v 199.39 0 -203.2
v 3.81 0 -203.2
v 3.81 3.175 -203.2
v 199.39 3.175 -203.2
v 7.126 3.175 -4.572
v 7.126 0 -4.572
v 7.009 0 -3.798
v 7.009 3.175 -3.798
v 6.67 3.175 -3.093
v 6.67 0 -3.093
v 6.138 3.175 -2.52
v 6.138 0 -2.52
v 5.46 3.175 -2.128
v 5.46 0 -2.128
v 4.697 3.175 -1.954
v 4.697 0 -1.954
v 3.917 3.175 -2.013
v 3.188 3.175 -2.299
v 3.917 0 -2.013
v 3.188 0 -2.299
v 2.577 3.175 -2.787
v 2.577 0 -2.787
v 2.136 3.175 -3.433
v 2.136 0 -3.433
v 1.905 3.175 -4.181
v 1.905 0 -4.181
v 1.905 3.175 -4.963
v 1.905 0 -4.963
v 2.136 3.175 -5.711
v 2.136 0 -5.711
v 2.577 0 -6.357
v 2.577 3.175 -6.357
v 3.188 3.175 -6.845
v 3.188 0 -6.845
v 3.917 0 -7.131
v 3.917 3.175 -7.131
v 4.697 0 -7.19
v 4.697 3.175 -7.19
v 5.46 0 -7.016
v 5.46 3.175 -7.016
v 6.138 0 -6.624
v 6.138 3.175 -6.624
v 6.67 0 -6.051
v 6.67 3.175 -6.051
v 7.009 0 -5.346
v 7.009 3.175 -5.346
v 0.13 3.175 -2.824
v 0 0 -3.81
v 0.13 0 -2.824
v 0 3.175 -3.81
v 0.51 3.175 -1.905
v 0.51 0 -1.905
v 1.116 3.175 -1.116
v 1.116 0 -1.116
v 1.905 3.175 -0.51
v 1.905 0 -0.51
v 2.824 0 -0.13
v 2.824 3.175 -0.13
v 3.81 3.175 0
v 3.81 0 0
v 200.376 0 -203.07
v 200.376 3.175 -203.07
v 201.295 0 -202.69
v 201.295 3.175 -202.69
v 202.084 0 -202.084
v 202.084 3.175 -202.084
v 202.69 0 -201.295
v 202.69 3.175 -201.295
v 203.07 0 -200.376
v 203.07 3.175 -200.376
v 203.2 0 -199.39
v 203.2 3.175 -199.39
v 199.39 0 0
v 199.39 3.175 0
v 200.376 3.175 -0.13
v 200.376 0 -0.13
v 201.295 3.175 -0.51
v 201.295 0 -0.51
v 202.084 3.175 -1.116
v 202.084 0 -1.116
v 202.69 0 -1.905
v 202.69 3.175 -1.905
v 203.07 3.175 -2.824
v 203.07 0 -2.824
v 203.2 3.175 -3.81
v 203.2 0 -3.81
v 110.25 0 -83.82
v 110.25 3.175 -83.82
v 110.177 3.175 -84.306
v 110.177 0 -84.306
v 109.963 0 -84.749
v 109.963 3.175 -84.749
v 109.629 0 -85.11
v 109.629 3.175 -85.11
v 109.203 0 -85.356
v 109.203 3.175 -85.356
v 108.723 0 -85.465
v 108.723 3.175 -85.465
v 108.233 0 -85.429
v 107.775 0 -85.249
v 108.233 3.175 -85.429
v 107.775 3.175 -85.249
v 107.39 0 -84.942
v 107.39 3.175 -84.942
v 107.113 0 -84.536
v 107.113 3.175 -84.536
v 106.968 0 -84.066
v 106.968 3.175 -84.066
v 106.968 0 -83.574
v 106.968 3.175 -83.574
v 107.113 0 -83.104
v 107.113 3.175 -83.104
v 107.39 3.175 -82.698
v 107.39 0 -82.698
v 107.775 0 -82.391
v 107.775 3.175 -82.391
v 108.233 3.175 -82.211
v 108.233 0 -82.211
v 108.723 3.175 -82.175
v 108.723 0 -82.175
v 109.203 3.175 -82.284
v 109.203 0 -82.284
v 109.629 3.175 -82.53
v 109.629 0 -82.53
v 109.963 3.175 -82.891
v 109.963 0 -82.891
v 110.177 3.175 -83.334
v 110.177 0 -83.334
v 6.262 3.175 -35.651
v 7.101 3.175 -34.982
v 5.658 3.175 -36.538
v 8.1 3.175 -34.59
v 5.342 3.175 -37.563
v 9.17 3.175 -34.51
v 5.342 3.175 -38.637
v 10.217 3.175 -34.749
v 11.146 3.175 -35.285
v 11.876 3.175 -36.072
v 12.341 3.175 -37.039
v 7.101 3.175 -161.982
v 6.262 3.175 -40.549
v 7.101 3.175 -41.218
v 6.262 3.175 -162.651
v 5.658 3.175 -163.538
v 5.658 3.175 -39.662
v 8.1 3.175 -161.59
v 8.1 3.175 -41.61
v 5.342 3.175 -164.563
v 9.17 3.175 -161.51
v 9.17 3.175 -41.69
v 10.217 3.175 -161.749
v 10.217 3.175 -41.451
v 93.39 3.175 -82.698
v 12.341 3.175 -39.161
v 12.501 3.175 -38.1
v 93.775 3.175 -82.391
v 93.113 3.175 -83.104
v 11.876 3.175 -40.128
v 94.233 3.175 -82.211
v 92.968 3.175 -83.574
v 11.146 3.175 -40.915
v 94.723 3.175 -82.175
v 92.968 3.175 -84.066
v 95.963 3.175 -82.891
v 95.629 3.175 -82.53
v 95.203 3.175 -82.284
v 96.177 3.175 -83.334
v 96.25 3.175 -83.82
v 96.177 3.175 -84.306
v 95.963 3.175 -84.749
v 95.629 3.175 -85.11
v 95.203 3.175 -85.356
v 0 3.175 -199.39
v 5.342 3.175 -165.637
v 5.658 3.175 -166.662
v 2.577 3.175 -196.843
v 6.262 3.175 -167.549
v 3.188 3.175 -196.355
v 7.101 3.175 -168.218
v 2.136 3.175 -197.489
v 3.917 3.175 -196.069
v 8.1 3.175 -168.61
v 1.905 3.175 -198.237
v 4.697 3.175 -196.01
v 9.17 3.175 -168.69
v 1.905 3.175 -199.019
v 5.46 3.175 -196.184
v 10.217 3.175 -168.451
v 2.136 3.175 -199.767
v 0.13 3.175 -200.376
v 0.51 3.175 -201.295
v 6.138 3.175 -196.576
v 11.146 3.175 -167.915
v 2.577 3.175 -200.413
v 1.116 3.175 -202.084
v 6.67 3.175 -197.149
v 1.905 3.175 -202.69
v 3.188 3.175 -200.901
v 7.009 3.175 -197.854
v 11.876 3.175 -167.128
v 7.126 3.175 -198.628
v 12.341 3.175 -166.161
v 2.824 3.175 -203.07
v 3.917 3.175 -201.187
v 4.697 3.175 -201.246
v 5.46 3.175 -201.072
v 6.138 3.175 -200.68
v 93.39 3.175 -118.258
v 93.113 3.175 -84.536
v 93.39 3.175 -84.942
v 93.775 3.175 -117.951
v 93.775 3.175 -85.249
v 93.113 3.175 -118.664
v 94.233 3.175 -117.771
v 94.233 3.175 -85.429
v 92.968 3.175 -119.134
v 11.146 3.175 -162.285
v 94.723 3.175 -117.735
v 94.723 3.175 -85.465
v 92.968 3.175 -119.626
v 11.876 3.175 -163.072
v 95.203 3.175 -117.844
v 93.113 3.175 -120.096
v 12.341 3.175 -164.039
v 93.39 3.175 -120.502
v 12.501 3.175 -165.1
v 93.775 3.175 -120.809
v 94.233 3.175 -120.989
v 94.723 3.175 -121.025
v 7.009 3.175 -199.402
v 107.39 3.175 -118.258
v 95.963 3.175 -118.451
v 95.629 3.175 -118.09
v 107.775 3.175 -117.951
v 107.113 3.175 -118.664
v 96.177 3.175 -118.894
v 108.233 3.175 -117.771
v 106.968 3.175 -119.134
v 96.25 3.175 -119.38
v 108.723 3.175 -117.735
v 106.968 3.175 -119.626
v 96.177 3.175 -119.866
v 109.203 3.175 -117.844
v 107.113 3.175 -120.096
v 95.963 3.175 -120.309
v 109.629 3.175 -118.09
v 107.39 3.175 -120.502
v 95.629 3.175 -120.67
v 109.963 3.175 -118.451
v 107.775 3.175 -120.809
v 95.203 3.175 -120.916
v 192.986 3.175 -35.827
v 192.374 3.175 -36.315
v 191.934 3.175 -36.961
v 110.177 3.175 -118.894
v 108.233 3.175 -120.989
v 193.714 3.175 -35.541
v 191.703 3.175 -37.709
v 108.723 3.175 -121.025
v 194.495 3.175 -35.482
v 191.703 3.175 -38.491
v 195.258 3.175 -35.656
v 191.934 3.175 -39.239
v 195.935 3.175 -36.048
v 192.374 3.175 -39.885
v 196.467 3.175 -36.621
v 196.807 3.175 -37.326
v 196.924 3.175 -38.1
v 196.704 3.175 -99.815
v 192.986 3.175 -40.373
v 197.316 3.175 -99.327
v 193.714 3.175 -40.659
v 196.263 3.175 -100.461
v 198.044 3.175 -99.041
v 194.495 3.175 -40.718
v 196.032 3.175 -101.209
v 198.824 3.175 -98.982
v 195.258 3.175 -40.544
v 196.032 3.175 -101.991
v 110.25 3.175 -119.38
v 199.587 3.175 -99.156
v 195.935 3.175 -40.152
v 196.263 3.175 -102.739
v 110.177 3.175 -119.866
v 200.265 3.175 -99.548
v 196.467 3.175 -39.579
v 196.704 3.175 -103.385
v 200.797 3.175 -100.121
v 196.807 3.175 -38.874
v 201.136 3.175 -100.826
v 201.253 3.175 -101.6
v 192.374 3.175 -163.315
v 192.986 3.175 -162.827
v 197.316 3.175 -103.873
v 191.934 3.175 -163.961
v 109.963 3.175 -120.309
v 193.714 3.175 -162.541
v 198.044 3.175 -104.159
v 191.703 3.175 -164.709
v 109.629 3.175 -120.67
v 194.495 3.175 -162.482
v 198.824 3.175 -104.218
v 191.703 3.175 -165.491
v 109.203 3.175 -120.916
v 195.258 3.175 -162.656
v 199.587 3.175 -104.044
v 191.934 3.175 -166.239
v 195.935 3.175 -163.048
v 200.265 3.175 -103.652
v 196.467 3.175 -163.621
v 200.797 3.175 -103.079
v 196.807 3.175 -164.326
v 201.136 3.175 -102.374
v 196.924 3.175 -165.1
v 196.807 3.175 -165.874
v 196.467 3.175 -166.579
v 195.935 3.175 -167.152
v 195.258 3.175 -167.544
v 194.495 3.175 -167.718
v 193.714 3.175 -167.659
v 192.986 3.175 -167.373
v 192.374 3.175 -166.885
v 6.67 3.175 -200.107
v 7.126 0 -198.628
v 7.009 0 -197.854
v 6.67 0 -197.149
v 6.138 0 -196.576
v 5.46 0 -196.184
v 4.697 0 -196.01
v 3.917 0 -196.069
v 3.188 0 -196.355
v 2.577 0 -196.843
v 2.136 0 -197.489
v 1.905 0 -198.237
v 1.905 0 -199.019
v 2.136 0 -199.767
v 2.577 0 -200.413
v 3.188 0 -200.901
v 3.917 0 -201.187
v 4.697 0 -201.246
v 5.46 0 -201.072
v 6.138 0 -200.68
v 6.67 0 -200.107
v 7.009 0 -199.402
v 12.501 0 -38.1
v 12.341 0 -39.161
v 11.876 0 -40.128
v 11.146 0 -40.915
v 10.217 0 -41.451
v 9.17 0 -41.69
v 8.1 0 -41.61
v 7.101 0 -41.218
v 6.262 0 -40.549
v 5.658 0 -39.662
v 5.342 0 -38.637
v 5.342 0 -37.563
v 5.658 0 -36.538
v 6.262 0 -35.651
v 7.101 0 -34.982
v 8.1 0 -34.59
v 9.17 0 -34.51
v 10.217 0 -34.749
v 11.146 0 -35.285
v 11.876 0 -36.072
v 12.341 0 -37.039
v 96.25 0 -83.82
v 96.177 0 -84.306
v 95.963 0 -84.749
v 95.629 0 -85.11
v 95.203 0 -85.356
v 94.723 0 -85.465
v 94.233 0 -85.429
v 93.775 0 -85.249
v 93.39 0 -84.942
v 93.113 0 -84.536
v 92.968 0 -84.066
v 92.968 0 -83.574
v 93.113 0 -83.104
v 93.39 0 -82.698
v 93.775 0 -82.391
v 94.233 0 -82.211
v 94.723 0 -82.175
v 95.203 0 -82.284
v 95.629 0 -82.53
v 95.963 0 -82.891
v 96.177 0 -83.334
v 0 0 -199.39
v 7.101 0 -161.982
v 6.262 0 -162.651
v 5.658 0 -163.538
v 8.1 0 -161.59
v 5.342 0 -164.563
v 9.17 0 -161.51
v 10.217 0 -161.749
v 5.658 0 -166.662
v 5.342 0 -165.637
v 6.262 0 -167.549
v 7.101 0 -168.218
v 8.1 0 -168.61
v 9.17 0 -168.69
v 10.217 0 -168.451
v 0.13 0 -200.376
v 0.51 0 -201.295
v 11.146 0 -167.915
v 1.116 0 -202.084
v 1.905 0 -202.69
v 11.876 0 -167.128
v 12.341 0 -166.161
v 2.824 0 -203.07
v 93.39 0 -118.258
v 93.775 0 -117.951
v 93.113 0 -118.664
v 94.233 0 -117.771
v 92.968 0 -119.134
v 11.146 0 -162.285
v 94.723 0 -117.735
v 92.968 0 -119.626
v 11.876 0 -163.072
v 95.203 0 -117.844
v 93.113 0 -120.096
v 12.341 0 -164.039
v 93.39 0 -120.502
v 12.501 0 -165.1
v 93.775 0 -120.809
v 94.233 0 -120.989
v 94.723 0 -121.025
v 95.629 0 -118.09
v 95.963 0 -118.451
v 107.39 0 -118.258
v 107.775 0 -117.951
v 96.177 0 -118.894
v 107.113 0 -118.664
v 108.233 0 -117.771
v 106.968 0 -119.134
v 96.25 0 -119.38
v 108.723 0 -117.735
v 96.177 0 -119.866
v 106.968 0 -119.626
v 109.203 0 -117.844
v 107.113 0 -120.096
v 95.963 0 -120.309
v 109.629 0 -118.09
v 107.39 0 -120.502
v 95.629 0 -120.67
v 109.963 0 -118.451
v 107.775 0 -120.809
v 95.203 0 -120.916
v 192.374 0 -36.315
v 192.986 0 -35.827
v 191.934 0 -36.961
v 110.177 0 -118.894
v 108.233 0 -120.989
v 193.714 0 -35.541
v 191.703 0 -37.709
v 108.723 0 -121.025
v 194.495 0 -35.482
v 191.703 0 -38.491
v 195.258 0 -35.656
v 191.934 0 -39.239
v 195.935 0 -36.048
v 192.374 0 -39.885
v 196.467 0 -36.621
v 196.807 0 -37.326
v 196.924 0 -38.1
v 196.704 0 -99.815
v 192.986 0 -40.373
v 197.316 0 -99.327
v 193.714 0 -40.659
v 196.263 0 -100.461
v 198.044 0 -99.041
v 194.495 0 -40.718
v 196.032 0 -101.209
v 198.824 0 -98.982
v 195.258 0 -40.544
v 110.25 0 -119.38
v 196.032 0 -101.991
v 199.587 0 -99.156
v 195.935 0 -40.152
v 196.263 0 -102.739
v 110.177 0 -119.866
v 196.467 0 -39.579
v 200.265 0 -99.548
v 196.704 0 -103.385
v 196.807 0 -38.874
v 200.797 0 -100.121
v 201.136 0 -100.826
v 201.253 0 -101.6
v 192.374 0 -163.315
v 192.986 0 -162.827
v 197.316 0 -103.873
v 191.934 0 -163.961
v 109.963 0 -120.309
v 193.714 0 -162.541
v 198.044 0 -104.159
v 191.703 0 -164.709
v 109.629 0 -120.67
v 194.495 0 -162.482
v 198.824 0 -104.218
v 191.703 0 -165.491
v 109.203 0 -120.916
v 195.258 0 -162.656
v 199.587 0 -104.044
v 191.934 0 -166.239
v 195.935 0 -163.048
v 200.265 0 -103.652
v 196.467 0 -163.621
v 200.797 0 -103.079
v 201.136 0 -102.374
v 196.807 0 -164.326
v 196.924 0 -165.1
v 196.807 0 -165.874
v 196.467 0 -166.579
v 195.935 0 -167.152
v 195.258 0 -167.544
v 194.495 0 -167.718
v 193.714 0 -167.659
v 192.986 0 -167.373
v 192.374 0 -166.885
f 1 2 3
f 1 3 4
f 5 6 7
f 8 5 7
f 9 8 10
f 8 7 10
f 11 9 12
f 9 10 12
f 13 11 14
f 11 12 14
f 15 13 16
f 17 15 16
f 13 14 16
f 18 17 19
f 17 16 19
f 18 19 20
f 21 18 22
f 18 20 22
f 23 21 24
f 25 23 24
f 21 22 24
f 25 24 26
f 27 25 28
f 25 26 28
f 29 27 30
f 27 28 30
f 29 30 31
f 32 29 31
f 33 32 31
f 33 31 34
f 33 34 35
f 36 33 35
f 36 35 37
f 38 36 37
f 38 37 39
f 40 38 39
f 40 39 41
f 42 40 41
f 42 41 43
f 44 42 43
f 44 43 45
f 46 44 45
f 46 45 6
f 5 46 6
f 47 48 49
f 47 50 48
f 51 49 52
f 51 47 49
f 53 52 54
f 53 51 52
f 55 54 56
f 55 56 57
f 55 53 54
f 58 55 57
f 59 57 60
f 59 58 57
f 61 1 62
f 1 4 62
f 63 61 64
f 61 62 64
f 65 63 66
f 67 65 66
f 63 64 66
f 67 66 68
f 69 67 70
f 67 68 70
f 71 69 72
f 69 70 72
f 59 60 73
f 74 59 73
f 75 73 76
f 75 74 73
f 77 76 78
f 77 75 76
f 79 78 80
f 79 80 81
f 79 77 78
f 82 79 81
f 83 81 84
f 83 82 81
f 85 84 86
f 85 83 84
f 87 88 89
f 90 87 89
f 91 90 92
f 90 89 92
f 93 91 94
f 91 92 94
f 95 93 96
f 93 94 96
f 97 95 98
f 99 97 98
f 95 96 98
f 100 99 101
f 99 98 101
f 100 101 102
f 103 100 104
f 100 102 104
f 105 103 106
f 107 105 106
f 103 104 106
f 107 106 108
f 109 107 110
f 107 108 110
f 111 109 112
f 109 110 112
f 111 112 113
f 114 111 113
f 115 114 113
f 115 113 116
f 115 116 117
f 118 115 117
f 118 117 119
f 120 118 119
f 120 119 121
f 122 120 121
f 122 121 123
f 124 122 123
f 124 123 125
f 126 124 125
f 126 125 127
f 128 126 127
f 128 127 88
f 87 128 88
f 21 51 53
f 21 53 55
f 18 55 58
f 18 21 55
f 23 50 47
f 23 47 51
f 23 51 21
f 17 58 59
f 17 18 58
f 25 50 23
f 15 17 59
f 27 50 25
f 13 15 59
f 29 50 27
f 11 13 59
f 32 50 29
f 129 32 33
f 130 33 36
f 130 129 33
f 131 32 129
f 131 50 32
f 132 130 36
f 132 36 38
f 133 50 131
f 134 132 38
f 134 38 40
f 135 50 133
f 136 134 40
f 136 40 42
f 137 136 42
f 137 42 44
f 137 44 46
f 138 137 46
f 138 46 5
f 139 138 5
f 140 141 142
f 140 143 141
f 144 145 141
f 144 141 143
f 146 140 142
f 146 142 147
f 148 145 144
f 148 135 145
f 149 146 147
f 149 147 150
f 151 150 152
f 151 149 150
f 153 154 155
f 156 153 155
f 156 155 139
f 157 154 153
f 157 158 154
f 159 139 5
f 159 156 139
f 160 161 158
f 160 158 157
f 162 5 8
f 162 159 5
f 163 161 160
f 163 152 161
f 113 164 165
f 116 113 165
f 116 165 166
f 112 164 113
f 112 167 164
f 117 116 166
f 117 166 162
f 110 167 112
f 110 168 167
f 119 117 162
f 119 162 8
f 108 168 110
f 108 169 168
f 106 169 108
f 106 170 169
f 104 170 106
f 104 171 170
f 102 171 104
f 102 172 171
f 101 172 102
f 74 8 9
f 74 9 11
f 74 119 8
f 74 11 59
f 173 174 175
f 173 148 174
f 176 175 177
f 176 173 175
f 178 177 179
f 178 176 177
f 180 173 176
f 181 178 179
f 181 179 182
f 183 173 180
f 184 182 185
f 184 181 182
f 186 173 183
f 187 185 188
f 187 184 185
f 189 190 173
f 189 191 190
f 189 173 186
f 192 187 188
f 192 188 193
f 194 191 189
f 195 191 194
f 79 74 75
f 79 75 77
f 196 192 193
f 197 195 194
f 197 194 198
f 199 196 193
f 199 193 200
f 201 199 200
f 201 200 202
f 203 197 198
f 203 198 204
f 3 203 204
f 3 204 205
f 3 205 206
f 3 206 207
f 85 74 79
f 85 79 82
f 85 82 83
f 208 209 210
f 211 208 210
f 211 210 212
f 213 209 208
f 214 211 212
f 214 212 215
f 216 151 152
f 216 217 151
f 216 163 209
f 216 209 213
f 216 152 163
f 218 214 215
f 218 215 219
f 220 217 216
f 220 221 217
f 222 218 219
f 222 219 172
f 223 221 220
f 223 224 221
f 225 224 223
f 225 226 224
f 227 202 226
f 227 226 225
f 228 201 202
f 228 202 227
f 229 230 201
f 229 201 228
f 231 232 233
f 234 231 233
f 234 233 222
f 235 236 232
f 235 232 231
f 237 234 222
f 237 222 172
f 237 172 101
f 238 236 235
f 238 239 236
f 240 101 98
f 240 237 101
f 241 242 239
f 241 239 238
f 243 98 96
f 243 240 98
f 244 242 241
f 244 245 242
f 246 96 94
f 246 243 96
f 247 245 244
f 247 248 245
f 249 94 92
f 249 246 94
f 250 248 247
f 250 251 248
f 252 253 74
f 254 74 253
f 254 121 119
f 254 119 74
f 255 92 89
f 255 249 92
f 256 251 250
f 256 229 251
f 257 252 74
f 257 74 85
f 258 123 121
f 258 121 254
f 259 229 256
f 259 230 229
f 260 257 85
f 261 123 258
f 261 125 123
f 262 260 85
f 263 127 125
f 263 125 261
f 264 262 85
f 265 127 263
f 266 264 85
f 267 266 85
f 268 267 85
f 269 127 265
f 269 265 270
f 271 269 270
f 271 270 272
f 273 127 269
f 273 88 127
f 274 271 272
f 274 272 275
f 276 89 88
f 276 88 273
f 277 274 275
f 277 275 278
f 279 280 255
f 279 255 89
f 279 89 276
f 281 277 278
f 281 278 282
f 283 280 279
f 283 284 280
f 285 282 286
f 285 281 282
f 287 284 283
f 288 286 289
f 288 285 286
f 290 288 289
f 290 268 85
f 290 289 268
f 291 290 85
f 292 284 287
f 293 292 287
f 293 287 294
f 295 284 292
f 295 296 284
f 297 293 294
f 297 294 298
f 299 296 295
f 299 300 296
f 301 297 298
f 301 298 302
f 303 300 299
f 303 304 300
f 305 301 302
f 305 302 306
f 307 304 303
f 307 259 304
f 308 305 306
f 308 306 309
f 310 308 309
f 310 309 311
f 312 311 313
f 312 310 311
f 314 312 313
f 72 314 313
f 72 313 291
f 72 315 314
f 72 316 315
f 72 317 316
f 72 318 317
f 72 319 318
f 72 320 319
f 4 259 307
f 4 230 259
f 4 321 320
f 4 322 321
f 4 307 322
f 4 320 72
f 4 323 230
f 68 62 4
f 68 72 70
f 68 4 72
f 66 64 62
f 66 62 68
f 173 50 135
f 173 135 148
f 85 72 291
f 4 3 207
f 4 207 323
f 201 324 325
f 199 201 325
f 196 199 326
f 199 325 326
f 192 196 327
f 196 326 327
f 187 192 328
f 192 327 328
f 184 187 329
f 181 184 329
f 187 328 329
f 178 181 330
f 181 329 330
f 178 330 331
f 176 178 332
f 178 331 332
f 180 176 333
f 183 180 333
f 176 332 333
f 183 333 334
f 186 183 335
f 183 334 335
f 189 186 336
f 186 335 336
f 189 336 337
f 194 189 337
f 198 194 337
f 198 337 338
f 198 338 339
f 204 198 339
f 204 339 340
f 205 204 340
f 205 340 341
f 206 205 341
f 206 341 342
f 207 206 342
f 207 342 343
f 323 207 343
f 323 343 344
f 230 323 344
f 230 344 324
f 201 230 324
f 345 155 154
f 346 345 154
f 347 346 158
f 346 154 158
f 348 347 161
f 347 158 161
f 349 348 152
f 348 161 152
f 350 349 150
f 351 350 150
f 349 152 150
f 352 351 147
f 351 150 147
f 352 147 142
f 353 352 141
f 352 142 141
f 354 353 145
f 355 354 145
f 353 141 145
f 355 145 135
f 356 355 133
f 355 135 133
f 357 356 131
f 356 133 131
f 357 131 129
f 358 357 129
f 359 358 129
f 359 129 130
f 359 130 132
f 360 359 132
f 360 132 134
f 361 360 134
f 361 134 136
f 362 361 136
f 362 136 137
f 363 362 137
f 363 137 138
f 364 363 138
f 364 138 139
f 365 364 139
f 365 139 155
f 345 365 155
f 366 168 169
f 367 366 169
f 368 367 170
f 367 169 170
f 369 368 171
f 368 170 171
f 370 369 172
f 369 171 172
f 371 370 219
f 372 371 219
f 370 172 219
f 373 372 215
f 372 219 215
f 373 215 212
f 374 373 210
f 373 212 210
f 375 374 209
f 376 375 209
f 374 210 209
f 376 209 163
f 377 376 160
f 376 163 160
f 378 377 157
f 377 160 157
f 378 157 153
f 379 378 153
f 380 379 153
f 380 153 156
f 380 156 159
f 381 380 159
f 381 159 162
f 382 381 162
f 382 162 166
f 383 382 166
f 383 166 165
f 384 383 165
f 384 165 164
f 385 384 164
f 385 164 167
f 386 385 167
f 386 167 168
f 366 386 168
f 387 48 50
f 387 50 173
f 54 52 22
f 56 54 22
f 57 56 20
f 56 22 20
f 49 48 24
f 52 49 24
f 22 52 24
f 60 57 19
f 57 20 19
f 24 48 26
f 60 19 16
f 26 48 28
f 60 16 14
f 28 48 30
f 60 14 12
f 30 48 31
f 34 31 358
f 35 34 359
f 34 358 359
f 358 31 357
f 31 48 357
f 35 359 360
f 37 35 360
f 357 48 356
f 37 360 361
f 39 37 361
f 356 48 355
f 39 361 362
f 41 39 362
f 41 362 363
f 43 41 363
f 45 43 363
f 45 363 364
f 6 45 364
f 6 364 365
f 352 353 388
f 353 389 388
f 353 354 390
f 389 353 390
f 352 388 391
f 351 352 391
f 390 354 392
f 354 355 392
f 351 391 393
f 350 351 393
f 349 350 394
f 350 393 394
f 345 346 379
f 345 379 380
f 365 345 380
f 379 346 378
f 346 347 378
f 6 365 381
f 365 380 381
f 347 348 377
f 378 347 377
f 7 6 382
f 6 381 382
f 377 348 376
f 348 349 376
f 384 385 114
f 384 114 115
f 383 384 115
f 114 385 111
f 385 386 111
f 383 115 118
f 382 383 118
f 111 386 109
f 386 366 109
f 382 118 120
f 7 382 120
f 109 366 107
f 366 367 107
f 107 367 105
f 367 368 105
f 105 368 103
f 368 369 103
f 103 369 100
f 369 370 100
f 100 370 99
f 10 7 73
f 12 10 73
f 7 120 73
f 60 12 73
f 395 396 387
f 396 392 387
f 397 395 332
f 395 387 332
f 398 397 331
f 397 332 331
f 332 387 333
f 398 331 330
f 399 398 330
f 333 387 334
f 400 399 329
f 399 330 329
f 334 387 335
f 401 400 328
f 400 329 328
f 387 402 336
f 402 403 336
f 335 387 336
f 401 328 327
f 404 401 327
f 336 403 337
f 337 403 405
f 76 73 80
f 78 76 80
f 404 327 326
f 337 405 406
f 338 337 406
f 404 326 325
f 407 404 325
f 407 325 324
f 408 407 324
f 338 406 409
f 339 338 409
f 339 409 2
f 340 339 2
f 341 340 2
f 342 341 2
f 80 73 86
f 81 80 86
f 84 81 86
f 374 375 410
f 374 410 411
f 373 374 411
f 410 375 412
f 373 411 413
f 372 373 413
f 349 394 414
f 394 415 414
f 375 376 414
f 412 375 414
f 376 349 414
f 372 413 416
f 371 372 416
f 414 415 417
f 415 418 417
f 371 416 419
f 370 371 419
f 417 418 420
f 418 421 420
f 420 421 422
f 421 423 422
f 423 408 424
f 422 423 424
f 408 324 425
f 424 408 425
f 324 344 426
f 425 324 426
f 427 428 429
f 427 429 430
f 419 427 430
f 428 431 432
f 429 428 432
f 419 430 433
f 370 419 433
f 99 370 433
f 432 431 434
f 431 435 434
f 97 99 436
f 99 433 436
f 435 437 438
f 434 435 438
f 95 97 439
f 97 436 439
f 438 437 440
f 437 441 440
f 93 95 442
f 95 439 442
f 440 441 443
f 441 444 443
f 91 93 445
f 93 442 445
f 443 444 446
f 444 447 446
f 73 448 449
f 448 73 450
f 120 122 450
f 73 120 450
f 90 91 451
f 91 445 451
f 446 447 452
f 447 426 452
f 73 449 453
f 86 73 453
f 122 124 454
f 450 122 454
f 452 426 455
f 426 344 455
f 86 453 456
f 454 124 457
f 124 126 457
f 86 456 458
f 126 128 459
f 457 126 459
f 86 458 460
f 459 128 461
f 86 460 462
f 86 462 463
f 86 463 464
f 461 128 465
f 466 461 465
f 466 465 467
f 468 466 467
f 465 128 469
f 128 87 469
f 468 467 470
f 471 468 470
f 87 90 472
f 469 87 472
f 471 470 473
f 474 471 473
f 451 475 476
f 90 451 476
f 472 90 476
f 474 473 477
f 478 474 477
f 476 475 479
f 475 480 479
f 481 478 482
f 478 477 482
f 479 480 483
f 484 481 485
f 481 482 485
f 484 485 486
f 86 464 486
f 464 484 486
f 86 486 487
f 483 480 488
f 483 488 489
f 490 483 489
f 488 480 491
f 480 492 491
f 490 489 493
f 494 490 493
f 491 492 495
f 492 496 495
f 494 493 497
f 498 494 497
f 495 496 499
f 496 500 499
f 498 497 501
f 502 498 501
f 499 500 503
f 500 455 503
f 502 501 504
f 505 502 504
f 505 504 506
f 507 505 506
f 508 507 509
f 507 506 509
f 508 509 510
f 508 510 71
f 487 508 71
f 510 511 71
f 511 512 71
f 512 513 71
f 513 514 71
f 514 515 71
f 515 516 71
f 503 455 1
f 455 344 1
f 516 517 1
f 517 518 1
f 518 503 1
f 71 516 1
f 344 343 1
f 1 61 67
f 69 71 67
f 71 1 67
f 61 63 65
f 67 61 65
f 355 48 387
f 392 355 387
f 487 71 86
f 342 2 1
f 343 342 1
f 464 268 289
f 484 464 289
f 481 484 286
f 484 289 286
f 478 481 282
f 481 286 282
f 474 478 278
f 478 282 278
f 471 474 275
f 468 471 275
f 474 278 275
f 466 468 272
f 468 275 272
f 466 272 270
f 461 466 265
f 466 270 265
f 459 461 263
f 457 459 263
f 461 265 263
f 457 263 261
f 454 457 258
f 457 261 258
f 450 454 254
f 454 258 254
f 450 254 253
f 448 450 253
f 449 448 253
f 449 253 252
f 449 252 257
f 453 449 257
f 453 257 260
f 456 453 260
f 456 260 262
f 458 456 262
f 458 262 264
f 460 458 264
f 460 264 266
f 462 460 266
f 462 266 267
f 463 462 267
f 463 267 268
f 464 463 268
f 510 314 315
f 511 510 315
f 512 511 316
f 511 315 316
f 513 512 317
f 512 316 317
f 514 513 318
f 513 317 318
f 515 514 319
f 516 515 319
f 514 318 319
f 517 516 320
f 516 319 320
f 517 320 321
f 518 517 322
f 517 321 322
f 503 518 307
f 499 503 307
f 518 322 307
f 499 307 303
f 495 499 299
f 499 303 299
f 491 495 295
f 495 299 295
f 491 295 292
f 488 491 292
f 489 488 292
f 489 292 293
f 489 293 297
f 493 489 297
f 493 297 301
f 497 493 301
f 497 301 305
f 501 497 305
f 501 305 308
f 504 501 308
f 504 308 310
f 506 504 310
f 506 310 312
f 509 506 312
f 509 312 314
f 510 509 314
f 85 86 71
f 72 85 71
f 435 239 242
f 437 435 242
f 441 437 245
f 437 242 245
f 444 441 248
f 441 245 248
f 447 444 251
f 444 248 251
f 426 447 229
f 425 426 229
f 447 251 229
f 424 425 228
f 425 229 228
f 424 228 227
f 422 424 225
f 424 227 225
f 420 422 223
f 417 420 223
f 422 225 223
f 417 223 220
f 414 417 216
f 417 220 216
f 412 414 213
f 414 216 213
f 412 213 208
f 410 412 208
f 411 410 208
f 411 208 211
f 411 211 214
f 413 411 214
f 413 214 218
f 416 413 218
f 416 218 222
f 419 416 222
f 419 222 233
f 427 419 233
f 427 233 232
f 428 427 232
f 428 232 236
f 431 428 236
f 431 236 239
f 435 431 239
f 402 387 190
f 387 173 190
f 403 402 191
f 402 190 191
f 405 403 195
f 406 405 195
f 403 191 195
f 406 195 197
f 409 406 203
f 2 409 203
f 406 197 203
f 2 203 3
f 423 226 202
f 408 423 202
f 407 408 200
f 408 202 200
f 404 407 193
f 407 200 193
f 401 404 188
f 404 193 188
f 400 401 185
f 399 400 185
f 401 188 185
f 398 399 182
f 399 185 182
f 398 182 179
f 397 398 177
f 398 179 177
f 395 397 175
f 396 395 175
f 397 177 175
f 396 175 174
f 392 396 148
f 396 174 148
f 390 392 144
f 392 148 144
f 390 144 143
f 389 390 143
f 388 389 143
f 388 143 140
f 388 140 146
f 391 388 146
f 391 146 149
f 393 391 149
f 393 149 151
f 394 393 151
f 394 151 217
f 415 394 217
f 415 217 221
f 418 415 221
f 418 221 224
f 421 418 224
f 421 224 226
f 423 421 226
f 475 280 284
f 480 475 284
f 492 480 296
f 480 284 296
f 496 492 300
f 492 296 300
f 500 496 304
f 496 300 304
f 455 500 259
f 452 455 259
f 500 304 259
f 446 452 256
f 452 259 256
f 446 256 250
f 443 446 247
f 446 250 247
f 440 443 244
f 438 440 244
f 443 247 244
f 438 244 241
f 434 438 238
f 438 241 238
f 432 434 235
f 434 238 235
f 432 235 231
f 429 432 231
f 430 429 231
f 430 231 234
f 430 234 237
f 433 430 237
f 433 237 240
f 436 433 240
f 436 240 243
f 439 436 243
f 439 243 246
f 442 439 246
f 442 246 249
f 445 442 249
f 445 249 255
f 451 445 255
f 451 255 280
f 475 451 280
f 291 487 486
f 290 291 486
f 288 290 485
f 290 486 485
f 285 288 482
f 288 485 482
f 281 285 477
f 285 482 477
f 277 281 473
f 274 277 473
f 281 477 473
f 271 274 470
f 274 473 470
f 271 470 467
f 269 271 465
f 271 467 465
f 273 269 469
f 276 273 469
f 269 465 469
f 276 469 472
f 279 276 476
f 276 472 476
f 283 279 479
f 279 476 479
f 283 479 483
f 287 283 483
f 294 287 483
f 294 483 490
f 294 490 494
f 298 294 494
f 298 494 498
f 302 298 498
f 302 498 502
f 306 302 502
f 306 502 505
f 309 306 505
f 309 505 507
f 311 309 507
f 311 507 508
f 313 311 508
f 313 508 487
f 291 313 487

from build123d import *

# Parameters (mm, degrees)
SKETCH1_W               = 203.2
SKETCH1_H               = 203.2
BOSS_EXTRUDE1_DEPTH     = 3.175
WHEEL_HOLES_REACH       = 5.175
SKETCH2_R               = 3.6
SKETCH2_R_2             = 2.625
BUILD_PLATE_HOLES_REACH = 5.175
SKETCH3_R               = 2.625
FILLET1_R               = 3.81
BELT_CLAMP_HOLES_REACH  = 5.175
SKETCH4_R               = 1.65


with BuildPart() as part:
    # Sketch1 → Boss-Extrude1 (new body)
    with BuildSketch(Plane(origin=(0, 0, 0), x_dir=(1, 0, 0), z_dir=(0, 1, 0))):
        with Locations((101.6, 101.6)):
            Rectangle(SKETCH1_W, SKETCH1_H)
    extrude(amount=BOSS_EXTRUDE1_DEPTH)

    # Sketch2 → wheel holes (cut, up to next)
    with BuildSketch(Plane(origin=(0, 3.175, 0), x_dir=(1, 0, 0), z_dir=(0, 1, 0)), mode=Mode.PRIVATE) as wheel_holes_sk1:
        with Locations((8.90143, 38.1)):
            Circle(SKETCH2_R)
    wheel_holes_tool1 = extrude(wheel_holes_sk1.sketch, amount=-WHEEL_HOLES_REACH, mode=Mode.PRIVATE) & part.part
    add(wheel_holes_tool1.solids().sort_by_distance((8.90143, 3.175, -38.1))[0], mode=Mode.SUBTRACT)
    # Sketch2 → wheel holes (cut, up to next)
    with BuildSketch(Plane(origin=(0, 3.175, 0), x_dir=(1, 0, 0), z_dir=(0, 1, 0)), mode=Mode.PRIVATE) as wheel_holes_sk2:
        with Locations((8.90143, 165.1)):
            Circle(SKETCH2_R)
    wheel_holes_tool2 = extrude(wheel_holes_sk2.sketch, amount=-WHEEL_HOLES_REACH, mode=Mode.PRIVATE) & part.part
    add(wheel_holes_tool2.solids().sort_by_distance((8.90143, 3.175, -165.1))[0], mode=Mode.SUBTRACT)
    # Sketch2 → wheel holes (cut, up to next)
    with BuildSketch(Plane(origin=(0, 3.175, 0), x_dir=(1, 0, 0), z_dir=(0, 1, 0)), mode=Mode.PRIVATE) as wheel_holes_sk3:
        with Locations((194.29857, 38.1)):
            Circle(SKETCH2_R_2)
    wheel_holes_tool3 = extrude(wheel_holes_sk3.sketch, amount=-WHEEL_HOLES_REACH, mode=Mode.PRIVATE) & part.part
    add(wheel_holes_tool3.solids().sort_by_distance((194.29857, 3.175, -38.1))[0], mode=Mode.SUBTRACT)
    # Sketch2 → wheel holes (cut, up to next)
    with BuildSketch(Plane(origin=(0, 3.175, 0), x_dir=(1, 0, 0), z_dir=(0, 1, 0)), mode=Mode.PRIVATE) as wheel_holes_sk4:
        with Locations((194.29857, 165.1)):
            Circle(SKETCH2_R_2)
    wheel_holes_tool4 = extrude(wheel_holes_sk4.sketch, amount=-WHEEL_HOLES_REACH, mode=Mode.PRIVATE) & part.part
    add(wheel_holes_tool4.solids().sort_by_distance((194.29857, 3.175, -165.1))[0], mode=Mode.SUBTRACT)

    # Sketch3 → build plate holes (cut, up to next)
    with BuildSketch(Plane.XZ, mode=Mode.PRIVATE) as build_plate_holes_sk1:
        with Locations((4.50088, -4.572)):
            Circle(SKETCH3_R)
    build_plate_holes_tool1 = extrude(build_plate_holes_sk1.sketch, amount=-BUILD_PLATE_HOLES_REACH, mode=Mode.PRIVATE) & part.part
    add(build_plate_holes_tool1.solids().sort_by_distance((4.50088, 0, -4.572))[0], mode=Mode.SUBTRACT)
    # Sketch3 → build plate holes (cut, up to next)
    with BuildSketch(Plane.XZ, mode=Mode.PRIVATE) as build_plate_holes_sk2:
        with Locations((4.50088, -198.628)):
            Circle(SKETCH3_R)
    build_plate_holes_tool2 = extrude(build_plate_holes_sk2.sketch, amount=-BUILD_PLATE_HOLES_REACH, mode=Mode.PRIVATE) & part.part
    add(build_plate_holes_tool2.solids().sort_by_distance((4.50088, 0, -198.628))[0], mode=Mode.SUBTRACT)
    # Sketch3 → build plate holes (cut, up to next)
    with BuildSketch(Plane.XZ, mode=Mode.PRIVATE) as build_plate_holes_sk3:
        with Locations((198.628, -101.6)):
            Circle(SKETCH3_R)
    build_plate_holes_tool3 = extrude(build_plate_holes_sk3.sketch, amount=-BUILD_PLATE_HOLES_REACH, mode=Mode.PRIVATE) & part.part
    add(build_plate_holes_tool3.solids().sort_by_distance((198.628, 0, -101.6))[0], mode=Mode.SUBTRACT)

    # Fillet1
    fillet1_edges = [part.edges().sort_by_distance(p)[0] for p in [
        (0, 1.5875, -203.2),
        (203.2, 1.5875, -203.2),
        (203.2, 1.5875, 0),
        (0, 1.5875, 0),
    ]]
    fillet(fillet1_edges, radius=FILLET1_R)

    # Sketch4 → belt clamp holes (cut, up to next)
    with BuildSketch(Plane(origin=(0, 3.175, 0), x_dir=(1, 0, 0), z_dir=(0, 1, 0)), mode=Mode.PRIVATE) as belt_clamp_holes_sk1:
        with Locations((94.6, 119.38)):
            Circle(SKETCH4_R)
    belt_clamp_holes_tool1 = extrude(belt_clamp_holes_sk1.sketch, amount=-BELT_CLAMP_HOLES_REACH, mode=Mode.PRIVATE) & part.part
    add(belt_clamp_holes_tool1.solids().sort_by_distance((94.6, 3.175, -119.38))[0], mode=Mode.SUBTRACT)
    # Sketch4 → belt clamp holes (cut, up to next)
    with BuildSketch(Plane(origin=(0, 3.175, 0), x_dir=(1, 0, 0), z_dir=(0, 1, 0)), mode=Mode.PRIVATE) as belt_clamp_holes_sk2:
        with Locations((108.6, 119.38)):
            Circle(SKETCH4_R)
    belt_clamp_holes_tool2 = extrude(belt_clamp_holes_sk2.sketch, amount=-BELT_CLAMP_HOLES_REACH, mode=Mode.PRIVATE) & part.part
    add(belt_clamp_holes_tool2.solids().sort_by_distance((108.6, 3.175, -119.38))[0], mode=Mode.SUBTRACT)
    # Sketch4 → belt clamp holes (cut, up to next)
    with BuildSketch(Plane(origin=(0, 3.175, 0), x_dir=(1, 0, 0), z_dir=(0, 1, 0)), mode=Mode.PRIVATE) as belt_clamp_holes_sk3:
        with Locations((108.6, 83.82)):
            Circle(SKETCH4_R)
    belt_clamp_holes_tool3 = extrude(belt_clamp_holes_sk3.sketch, amount=-BELT_CLAMP_HOLES_REACH, mode=Mode.PRIVATE) & part.part
    add(belt_clamp_holes_tool3.solids().sort_by_distance((108.6, 3.175, -83.82))[0], mode=Mode.SUBTRACT)
    # Sketch4 → belt clamp holes (cut, up to next)
    with BuildSketch(Plane(origin=(0, 3.175, 0), x_dir=(1, 0, 0), z_dir=(0, 1, 0)), mode=Mode.PRIVATE) as belt_clamp_holes_sk4:
        with Locations((94.6, 83.82)):
            Circle(SKETCH4_R)
    belt_clamp_holes_tool4 = extrude(belt_clamp_holes_sk4.sketch, amount=-BELT_CLAMP_HOLES_REACH, mode=Mode.PRIVATE) & part.part
    add(belt_clamp_holes_tool4.solids().sort_by_distance((94.6, 3.175, -83.82))[0], mode=Mode.SUBTRACT)


solid = part.part
